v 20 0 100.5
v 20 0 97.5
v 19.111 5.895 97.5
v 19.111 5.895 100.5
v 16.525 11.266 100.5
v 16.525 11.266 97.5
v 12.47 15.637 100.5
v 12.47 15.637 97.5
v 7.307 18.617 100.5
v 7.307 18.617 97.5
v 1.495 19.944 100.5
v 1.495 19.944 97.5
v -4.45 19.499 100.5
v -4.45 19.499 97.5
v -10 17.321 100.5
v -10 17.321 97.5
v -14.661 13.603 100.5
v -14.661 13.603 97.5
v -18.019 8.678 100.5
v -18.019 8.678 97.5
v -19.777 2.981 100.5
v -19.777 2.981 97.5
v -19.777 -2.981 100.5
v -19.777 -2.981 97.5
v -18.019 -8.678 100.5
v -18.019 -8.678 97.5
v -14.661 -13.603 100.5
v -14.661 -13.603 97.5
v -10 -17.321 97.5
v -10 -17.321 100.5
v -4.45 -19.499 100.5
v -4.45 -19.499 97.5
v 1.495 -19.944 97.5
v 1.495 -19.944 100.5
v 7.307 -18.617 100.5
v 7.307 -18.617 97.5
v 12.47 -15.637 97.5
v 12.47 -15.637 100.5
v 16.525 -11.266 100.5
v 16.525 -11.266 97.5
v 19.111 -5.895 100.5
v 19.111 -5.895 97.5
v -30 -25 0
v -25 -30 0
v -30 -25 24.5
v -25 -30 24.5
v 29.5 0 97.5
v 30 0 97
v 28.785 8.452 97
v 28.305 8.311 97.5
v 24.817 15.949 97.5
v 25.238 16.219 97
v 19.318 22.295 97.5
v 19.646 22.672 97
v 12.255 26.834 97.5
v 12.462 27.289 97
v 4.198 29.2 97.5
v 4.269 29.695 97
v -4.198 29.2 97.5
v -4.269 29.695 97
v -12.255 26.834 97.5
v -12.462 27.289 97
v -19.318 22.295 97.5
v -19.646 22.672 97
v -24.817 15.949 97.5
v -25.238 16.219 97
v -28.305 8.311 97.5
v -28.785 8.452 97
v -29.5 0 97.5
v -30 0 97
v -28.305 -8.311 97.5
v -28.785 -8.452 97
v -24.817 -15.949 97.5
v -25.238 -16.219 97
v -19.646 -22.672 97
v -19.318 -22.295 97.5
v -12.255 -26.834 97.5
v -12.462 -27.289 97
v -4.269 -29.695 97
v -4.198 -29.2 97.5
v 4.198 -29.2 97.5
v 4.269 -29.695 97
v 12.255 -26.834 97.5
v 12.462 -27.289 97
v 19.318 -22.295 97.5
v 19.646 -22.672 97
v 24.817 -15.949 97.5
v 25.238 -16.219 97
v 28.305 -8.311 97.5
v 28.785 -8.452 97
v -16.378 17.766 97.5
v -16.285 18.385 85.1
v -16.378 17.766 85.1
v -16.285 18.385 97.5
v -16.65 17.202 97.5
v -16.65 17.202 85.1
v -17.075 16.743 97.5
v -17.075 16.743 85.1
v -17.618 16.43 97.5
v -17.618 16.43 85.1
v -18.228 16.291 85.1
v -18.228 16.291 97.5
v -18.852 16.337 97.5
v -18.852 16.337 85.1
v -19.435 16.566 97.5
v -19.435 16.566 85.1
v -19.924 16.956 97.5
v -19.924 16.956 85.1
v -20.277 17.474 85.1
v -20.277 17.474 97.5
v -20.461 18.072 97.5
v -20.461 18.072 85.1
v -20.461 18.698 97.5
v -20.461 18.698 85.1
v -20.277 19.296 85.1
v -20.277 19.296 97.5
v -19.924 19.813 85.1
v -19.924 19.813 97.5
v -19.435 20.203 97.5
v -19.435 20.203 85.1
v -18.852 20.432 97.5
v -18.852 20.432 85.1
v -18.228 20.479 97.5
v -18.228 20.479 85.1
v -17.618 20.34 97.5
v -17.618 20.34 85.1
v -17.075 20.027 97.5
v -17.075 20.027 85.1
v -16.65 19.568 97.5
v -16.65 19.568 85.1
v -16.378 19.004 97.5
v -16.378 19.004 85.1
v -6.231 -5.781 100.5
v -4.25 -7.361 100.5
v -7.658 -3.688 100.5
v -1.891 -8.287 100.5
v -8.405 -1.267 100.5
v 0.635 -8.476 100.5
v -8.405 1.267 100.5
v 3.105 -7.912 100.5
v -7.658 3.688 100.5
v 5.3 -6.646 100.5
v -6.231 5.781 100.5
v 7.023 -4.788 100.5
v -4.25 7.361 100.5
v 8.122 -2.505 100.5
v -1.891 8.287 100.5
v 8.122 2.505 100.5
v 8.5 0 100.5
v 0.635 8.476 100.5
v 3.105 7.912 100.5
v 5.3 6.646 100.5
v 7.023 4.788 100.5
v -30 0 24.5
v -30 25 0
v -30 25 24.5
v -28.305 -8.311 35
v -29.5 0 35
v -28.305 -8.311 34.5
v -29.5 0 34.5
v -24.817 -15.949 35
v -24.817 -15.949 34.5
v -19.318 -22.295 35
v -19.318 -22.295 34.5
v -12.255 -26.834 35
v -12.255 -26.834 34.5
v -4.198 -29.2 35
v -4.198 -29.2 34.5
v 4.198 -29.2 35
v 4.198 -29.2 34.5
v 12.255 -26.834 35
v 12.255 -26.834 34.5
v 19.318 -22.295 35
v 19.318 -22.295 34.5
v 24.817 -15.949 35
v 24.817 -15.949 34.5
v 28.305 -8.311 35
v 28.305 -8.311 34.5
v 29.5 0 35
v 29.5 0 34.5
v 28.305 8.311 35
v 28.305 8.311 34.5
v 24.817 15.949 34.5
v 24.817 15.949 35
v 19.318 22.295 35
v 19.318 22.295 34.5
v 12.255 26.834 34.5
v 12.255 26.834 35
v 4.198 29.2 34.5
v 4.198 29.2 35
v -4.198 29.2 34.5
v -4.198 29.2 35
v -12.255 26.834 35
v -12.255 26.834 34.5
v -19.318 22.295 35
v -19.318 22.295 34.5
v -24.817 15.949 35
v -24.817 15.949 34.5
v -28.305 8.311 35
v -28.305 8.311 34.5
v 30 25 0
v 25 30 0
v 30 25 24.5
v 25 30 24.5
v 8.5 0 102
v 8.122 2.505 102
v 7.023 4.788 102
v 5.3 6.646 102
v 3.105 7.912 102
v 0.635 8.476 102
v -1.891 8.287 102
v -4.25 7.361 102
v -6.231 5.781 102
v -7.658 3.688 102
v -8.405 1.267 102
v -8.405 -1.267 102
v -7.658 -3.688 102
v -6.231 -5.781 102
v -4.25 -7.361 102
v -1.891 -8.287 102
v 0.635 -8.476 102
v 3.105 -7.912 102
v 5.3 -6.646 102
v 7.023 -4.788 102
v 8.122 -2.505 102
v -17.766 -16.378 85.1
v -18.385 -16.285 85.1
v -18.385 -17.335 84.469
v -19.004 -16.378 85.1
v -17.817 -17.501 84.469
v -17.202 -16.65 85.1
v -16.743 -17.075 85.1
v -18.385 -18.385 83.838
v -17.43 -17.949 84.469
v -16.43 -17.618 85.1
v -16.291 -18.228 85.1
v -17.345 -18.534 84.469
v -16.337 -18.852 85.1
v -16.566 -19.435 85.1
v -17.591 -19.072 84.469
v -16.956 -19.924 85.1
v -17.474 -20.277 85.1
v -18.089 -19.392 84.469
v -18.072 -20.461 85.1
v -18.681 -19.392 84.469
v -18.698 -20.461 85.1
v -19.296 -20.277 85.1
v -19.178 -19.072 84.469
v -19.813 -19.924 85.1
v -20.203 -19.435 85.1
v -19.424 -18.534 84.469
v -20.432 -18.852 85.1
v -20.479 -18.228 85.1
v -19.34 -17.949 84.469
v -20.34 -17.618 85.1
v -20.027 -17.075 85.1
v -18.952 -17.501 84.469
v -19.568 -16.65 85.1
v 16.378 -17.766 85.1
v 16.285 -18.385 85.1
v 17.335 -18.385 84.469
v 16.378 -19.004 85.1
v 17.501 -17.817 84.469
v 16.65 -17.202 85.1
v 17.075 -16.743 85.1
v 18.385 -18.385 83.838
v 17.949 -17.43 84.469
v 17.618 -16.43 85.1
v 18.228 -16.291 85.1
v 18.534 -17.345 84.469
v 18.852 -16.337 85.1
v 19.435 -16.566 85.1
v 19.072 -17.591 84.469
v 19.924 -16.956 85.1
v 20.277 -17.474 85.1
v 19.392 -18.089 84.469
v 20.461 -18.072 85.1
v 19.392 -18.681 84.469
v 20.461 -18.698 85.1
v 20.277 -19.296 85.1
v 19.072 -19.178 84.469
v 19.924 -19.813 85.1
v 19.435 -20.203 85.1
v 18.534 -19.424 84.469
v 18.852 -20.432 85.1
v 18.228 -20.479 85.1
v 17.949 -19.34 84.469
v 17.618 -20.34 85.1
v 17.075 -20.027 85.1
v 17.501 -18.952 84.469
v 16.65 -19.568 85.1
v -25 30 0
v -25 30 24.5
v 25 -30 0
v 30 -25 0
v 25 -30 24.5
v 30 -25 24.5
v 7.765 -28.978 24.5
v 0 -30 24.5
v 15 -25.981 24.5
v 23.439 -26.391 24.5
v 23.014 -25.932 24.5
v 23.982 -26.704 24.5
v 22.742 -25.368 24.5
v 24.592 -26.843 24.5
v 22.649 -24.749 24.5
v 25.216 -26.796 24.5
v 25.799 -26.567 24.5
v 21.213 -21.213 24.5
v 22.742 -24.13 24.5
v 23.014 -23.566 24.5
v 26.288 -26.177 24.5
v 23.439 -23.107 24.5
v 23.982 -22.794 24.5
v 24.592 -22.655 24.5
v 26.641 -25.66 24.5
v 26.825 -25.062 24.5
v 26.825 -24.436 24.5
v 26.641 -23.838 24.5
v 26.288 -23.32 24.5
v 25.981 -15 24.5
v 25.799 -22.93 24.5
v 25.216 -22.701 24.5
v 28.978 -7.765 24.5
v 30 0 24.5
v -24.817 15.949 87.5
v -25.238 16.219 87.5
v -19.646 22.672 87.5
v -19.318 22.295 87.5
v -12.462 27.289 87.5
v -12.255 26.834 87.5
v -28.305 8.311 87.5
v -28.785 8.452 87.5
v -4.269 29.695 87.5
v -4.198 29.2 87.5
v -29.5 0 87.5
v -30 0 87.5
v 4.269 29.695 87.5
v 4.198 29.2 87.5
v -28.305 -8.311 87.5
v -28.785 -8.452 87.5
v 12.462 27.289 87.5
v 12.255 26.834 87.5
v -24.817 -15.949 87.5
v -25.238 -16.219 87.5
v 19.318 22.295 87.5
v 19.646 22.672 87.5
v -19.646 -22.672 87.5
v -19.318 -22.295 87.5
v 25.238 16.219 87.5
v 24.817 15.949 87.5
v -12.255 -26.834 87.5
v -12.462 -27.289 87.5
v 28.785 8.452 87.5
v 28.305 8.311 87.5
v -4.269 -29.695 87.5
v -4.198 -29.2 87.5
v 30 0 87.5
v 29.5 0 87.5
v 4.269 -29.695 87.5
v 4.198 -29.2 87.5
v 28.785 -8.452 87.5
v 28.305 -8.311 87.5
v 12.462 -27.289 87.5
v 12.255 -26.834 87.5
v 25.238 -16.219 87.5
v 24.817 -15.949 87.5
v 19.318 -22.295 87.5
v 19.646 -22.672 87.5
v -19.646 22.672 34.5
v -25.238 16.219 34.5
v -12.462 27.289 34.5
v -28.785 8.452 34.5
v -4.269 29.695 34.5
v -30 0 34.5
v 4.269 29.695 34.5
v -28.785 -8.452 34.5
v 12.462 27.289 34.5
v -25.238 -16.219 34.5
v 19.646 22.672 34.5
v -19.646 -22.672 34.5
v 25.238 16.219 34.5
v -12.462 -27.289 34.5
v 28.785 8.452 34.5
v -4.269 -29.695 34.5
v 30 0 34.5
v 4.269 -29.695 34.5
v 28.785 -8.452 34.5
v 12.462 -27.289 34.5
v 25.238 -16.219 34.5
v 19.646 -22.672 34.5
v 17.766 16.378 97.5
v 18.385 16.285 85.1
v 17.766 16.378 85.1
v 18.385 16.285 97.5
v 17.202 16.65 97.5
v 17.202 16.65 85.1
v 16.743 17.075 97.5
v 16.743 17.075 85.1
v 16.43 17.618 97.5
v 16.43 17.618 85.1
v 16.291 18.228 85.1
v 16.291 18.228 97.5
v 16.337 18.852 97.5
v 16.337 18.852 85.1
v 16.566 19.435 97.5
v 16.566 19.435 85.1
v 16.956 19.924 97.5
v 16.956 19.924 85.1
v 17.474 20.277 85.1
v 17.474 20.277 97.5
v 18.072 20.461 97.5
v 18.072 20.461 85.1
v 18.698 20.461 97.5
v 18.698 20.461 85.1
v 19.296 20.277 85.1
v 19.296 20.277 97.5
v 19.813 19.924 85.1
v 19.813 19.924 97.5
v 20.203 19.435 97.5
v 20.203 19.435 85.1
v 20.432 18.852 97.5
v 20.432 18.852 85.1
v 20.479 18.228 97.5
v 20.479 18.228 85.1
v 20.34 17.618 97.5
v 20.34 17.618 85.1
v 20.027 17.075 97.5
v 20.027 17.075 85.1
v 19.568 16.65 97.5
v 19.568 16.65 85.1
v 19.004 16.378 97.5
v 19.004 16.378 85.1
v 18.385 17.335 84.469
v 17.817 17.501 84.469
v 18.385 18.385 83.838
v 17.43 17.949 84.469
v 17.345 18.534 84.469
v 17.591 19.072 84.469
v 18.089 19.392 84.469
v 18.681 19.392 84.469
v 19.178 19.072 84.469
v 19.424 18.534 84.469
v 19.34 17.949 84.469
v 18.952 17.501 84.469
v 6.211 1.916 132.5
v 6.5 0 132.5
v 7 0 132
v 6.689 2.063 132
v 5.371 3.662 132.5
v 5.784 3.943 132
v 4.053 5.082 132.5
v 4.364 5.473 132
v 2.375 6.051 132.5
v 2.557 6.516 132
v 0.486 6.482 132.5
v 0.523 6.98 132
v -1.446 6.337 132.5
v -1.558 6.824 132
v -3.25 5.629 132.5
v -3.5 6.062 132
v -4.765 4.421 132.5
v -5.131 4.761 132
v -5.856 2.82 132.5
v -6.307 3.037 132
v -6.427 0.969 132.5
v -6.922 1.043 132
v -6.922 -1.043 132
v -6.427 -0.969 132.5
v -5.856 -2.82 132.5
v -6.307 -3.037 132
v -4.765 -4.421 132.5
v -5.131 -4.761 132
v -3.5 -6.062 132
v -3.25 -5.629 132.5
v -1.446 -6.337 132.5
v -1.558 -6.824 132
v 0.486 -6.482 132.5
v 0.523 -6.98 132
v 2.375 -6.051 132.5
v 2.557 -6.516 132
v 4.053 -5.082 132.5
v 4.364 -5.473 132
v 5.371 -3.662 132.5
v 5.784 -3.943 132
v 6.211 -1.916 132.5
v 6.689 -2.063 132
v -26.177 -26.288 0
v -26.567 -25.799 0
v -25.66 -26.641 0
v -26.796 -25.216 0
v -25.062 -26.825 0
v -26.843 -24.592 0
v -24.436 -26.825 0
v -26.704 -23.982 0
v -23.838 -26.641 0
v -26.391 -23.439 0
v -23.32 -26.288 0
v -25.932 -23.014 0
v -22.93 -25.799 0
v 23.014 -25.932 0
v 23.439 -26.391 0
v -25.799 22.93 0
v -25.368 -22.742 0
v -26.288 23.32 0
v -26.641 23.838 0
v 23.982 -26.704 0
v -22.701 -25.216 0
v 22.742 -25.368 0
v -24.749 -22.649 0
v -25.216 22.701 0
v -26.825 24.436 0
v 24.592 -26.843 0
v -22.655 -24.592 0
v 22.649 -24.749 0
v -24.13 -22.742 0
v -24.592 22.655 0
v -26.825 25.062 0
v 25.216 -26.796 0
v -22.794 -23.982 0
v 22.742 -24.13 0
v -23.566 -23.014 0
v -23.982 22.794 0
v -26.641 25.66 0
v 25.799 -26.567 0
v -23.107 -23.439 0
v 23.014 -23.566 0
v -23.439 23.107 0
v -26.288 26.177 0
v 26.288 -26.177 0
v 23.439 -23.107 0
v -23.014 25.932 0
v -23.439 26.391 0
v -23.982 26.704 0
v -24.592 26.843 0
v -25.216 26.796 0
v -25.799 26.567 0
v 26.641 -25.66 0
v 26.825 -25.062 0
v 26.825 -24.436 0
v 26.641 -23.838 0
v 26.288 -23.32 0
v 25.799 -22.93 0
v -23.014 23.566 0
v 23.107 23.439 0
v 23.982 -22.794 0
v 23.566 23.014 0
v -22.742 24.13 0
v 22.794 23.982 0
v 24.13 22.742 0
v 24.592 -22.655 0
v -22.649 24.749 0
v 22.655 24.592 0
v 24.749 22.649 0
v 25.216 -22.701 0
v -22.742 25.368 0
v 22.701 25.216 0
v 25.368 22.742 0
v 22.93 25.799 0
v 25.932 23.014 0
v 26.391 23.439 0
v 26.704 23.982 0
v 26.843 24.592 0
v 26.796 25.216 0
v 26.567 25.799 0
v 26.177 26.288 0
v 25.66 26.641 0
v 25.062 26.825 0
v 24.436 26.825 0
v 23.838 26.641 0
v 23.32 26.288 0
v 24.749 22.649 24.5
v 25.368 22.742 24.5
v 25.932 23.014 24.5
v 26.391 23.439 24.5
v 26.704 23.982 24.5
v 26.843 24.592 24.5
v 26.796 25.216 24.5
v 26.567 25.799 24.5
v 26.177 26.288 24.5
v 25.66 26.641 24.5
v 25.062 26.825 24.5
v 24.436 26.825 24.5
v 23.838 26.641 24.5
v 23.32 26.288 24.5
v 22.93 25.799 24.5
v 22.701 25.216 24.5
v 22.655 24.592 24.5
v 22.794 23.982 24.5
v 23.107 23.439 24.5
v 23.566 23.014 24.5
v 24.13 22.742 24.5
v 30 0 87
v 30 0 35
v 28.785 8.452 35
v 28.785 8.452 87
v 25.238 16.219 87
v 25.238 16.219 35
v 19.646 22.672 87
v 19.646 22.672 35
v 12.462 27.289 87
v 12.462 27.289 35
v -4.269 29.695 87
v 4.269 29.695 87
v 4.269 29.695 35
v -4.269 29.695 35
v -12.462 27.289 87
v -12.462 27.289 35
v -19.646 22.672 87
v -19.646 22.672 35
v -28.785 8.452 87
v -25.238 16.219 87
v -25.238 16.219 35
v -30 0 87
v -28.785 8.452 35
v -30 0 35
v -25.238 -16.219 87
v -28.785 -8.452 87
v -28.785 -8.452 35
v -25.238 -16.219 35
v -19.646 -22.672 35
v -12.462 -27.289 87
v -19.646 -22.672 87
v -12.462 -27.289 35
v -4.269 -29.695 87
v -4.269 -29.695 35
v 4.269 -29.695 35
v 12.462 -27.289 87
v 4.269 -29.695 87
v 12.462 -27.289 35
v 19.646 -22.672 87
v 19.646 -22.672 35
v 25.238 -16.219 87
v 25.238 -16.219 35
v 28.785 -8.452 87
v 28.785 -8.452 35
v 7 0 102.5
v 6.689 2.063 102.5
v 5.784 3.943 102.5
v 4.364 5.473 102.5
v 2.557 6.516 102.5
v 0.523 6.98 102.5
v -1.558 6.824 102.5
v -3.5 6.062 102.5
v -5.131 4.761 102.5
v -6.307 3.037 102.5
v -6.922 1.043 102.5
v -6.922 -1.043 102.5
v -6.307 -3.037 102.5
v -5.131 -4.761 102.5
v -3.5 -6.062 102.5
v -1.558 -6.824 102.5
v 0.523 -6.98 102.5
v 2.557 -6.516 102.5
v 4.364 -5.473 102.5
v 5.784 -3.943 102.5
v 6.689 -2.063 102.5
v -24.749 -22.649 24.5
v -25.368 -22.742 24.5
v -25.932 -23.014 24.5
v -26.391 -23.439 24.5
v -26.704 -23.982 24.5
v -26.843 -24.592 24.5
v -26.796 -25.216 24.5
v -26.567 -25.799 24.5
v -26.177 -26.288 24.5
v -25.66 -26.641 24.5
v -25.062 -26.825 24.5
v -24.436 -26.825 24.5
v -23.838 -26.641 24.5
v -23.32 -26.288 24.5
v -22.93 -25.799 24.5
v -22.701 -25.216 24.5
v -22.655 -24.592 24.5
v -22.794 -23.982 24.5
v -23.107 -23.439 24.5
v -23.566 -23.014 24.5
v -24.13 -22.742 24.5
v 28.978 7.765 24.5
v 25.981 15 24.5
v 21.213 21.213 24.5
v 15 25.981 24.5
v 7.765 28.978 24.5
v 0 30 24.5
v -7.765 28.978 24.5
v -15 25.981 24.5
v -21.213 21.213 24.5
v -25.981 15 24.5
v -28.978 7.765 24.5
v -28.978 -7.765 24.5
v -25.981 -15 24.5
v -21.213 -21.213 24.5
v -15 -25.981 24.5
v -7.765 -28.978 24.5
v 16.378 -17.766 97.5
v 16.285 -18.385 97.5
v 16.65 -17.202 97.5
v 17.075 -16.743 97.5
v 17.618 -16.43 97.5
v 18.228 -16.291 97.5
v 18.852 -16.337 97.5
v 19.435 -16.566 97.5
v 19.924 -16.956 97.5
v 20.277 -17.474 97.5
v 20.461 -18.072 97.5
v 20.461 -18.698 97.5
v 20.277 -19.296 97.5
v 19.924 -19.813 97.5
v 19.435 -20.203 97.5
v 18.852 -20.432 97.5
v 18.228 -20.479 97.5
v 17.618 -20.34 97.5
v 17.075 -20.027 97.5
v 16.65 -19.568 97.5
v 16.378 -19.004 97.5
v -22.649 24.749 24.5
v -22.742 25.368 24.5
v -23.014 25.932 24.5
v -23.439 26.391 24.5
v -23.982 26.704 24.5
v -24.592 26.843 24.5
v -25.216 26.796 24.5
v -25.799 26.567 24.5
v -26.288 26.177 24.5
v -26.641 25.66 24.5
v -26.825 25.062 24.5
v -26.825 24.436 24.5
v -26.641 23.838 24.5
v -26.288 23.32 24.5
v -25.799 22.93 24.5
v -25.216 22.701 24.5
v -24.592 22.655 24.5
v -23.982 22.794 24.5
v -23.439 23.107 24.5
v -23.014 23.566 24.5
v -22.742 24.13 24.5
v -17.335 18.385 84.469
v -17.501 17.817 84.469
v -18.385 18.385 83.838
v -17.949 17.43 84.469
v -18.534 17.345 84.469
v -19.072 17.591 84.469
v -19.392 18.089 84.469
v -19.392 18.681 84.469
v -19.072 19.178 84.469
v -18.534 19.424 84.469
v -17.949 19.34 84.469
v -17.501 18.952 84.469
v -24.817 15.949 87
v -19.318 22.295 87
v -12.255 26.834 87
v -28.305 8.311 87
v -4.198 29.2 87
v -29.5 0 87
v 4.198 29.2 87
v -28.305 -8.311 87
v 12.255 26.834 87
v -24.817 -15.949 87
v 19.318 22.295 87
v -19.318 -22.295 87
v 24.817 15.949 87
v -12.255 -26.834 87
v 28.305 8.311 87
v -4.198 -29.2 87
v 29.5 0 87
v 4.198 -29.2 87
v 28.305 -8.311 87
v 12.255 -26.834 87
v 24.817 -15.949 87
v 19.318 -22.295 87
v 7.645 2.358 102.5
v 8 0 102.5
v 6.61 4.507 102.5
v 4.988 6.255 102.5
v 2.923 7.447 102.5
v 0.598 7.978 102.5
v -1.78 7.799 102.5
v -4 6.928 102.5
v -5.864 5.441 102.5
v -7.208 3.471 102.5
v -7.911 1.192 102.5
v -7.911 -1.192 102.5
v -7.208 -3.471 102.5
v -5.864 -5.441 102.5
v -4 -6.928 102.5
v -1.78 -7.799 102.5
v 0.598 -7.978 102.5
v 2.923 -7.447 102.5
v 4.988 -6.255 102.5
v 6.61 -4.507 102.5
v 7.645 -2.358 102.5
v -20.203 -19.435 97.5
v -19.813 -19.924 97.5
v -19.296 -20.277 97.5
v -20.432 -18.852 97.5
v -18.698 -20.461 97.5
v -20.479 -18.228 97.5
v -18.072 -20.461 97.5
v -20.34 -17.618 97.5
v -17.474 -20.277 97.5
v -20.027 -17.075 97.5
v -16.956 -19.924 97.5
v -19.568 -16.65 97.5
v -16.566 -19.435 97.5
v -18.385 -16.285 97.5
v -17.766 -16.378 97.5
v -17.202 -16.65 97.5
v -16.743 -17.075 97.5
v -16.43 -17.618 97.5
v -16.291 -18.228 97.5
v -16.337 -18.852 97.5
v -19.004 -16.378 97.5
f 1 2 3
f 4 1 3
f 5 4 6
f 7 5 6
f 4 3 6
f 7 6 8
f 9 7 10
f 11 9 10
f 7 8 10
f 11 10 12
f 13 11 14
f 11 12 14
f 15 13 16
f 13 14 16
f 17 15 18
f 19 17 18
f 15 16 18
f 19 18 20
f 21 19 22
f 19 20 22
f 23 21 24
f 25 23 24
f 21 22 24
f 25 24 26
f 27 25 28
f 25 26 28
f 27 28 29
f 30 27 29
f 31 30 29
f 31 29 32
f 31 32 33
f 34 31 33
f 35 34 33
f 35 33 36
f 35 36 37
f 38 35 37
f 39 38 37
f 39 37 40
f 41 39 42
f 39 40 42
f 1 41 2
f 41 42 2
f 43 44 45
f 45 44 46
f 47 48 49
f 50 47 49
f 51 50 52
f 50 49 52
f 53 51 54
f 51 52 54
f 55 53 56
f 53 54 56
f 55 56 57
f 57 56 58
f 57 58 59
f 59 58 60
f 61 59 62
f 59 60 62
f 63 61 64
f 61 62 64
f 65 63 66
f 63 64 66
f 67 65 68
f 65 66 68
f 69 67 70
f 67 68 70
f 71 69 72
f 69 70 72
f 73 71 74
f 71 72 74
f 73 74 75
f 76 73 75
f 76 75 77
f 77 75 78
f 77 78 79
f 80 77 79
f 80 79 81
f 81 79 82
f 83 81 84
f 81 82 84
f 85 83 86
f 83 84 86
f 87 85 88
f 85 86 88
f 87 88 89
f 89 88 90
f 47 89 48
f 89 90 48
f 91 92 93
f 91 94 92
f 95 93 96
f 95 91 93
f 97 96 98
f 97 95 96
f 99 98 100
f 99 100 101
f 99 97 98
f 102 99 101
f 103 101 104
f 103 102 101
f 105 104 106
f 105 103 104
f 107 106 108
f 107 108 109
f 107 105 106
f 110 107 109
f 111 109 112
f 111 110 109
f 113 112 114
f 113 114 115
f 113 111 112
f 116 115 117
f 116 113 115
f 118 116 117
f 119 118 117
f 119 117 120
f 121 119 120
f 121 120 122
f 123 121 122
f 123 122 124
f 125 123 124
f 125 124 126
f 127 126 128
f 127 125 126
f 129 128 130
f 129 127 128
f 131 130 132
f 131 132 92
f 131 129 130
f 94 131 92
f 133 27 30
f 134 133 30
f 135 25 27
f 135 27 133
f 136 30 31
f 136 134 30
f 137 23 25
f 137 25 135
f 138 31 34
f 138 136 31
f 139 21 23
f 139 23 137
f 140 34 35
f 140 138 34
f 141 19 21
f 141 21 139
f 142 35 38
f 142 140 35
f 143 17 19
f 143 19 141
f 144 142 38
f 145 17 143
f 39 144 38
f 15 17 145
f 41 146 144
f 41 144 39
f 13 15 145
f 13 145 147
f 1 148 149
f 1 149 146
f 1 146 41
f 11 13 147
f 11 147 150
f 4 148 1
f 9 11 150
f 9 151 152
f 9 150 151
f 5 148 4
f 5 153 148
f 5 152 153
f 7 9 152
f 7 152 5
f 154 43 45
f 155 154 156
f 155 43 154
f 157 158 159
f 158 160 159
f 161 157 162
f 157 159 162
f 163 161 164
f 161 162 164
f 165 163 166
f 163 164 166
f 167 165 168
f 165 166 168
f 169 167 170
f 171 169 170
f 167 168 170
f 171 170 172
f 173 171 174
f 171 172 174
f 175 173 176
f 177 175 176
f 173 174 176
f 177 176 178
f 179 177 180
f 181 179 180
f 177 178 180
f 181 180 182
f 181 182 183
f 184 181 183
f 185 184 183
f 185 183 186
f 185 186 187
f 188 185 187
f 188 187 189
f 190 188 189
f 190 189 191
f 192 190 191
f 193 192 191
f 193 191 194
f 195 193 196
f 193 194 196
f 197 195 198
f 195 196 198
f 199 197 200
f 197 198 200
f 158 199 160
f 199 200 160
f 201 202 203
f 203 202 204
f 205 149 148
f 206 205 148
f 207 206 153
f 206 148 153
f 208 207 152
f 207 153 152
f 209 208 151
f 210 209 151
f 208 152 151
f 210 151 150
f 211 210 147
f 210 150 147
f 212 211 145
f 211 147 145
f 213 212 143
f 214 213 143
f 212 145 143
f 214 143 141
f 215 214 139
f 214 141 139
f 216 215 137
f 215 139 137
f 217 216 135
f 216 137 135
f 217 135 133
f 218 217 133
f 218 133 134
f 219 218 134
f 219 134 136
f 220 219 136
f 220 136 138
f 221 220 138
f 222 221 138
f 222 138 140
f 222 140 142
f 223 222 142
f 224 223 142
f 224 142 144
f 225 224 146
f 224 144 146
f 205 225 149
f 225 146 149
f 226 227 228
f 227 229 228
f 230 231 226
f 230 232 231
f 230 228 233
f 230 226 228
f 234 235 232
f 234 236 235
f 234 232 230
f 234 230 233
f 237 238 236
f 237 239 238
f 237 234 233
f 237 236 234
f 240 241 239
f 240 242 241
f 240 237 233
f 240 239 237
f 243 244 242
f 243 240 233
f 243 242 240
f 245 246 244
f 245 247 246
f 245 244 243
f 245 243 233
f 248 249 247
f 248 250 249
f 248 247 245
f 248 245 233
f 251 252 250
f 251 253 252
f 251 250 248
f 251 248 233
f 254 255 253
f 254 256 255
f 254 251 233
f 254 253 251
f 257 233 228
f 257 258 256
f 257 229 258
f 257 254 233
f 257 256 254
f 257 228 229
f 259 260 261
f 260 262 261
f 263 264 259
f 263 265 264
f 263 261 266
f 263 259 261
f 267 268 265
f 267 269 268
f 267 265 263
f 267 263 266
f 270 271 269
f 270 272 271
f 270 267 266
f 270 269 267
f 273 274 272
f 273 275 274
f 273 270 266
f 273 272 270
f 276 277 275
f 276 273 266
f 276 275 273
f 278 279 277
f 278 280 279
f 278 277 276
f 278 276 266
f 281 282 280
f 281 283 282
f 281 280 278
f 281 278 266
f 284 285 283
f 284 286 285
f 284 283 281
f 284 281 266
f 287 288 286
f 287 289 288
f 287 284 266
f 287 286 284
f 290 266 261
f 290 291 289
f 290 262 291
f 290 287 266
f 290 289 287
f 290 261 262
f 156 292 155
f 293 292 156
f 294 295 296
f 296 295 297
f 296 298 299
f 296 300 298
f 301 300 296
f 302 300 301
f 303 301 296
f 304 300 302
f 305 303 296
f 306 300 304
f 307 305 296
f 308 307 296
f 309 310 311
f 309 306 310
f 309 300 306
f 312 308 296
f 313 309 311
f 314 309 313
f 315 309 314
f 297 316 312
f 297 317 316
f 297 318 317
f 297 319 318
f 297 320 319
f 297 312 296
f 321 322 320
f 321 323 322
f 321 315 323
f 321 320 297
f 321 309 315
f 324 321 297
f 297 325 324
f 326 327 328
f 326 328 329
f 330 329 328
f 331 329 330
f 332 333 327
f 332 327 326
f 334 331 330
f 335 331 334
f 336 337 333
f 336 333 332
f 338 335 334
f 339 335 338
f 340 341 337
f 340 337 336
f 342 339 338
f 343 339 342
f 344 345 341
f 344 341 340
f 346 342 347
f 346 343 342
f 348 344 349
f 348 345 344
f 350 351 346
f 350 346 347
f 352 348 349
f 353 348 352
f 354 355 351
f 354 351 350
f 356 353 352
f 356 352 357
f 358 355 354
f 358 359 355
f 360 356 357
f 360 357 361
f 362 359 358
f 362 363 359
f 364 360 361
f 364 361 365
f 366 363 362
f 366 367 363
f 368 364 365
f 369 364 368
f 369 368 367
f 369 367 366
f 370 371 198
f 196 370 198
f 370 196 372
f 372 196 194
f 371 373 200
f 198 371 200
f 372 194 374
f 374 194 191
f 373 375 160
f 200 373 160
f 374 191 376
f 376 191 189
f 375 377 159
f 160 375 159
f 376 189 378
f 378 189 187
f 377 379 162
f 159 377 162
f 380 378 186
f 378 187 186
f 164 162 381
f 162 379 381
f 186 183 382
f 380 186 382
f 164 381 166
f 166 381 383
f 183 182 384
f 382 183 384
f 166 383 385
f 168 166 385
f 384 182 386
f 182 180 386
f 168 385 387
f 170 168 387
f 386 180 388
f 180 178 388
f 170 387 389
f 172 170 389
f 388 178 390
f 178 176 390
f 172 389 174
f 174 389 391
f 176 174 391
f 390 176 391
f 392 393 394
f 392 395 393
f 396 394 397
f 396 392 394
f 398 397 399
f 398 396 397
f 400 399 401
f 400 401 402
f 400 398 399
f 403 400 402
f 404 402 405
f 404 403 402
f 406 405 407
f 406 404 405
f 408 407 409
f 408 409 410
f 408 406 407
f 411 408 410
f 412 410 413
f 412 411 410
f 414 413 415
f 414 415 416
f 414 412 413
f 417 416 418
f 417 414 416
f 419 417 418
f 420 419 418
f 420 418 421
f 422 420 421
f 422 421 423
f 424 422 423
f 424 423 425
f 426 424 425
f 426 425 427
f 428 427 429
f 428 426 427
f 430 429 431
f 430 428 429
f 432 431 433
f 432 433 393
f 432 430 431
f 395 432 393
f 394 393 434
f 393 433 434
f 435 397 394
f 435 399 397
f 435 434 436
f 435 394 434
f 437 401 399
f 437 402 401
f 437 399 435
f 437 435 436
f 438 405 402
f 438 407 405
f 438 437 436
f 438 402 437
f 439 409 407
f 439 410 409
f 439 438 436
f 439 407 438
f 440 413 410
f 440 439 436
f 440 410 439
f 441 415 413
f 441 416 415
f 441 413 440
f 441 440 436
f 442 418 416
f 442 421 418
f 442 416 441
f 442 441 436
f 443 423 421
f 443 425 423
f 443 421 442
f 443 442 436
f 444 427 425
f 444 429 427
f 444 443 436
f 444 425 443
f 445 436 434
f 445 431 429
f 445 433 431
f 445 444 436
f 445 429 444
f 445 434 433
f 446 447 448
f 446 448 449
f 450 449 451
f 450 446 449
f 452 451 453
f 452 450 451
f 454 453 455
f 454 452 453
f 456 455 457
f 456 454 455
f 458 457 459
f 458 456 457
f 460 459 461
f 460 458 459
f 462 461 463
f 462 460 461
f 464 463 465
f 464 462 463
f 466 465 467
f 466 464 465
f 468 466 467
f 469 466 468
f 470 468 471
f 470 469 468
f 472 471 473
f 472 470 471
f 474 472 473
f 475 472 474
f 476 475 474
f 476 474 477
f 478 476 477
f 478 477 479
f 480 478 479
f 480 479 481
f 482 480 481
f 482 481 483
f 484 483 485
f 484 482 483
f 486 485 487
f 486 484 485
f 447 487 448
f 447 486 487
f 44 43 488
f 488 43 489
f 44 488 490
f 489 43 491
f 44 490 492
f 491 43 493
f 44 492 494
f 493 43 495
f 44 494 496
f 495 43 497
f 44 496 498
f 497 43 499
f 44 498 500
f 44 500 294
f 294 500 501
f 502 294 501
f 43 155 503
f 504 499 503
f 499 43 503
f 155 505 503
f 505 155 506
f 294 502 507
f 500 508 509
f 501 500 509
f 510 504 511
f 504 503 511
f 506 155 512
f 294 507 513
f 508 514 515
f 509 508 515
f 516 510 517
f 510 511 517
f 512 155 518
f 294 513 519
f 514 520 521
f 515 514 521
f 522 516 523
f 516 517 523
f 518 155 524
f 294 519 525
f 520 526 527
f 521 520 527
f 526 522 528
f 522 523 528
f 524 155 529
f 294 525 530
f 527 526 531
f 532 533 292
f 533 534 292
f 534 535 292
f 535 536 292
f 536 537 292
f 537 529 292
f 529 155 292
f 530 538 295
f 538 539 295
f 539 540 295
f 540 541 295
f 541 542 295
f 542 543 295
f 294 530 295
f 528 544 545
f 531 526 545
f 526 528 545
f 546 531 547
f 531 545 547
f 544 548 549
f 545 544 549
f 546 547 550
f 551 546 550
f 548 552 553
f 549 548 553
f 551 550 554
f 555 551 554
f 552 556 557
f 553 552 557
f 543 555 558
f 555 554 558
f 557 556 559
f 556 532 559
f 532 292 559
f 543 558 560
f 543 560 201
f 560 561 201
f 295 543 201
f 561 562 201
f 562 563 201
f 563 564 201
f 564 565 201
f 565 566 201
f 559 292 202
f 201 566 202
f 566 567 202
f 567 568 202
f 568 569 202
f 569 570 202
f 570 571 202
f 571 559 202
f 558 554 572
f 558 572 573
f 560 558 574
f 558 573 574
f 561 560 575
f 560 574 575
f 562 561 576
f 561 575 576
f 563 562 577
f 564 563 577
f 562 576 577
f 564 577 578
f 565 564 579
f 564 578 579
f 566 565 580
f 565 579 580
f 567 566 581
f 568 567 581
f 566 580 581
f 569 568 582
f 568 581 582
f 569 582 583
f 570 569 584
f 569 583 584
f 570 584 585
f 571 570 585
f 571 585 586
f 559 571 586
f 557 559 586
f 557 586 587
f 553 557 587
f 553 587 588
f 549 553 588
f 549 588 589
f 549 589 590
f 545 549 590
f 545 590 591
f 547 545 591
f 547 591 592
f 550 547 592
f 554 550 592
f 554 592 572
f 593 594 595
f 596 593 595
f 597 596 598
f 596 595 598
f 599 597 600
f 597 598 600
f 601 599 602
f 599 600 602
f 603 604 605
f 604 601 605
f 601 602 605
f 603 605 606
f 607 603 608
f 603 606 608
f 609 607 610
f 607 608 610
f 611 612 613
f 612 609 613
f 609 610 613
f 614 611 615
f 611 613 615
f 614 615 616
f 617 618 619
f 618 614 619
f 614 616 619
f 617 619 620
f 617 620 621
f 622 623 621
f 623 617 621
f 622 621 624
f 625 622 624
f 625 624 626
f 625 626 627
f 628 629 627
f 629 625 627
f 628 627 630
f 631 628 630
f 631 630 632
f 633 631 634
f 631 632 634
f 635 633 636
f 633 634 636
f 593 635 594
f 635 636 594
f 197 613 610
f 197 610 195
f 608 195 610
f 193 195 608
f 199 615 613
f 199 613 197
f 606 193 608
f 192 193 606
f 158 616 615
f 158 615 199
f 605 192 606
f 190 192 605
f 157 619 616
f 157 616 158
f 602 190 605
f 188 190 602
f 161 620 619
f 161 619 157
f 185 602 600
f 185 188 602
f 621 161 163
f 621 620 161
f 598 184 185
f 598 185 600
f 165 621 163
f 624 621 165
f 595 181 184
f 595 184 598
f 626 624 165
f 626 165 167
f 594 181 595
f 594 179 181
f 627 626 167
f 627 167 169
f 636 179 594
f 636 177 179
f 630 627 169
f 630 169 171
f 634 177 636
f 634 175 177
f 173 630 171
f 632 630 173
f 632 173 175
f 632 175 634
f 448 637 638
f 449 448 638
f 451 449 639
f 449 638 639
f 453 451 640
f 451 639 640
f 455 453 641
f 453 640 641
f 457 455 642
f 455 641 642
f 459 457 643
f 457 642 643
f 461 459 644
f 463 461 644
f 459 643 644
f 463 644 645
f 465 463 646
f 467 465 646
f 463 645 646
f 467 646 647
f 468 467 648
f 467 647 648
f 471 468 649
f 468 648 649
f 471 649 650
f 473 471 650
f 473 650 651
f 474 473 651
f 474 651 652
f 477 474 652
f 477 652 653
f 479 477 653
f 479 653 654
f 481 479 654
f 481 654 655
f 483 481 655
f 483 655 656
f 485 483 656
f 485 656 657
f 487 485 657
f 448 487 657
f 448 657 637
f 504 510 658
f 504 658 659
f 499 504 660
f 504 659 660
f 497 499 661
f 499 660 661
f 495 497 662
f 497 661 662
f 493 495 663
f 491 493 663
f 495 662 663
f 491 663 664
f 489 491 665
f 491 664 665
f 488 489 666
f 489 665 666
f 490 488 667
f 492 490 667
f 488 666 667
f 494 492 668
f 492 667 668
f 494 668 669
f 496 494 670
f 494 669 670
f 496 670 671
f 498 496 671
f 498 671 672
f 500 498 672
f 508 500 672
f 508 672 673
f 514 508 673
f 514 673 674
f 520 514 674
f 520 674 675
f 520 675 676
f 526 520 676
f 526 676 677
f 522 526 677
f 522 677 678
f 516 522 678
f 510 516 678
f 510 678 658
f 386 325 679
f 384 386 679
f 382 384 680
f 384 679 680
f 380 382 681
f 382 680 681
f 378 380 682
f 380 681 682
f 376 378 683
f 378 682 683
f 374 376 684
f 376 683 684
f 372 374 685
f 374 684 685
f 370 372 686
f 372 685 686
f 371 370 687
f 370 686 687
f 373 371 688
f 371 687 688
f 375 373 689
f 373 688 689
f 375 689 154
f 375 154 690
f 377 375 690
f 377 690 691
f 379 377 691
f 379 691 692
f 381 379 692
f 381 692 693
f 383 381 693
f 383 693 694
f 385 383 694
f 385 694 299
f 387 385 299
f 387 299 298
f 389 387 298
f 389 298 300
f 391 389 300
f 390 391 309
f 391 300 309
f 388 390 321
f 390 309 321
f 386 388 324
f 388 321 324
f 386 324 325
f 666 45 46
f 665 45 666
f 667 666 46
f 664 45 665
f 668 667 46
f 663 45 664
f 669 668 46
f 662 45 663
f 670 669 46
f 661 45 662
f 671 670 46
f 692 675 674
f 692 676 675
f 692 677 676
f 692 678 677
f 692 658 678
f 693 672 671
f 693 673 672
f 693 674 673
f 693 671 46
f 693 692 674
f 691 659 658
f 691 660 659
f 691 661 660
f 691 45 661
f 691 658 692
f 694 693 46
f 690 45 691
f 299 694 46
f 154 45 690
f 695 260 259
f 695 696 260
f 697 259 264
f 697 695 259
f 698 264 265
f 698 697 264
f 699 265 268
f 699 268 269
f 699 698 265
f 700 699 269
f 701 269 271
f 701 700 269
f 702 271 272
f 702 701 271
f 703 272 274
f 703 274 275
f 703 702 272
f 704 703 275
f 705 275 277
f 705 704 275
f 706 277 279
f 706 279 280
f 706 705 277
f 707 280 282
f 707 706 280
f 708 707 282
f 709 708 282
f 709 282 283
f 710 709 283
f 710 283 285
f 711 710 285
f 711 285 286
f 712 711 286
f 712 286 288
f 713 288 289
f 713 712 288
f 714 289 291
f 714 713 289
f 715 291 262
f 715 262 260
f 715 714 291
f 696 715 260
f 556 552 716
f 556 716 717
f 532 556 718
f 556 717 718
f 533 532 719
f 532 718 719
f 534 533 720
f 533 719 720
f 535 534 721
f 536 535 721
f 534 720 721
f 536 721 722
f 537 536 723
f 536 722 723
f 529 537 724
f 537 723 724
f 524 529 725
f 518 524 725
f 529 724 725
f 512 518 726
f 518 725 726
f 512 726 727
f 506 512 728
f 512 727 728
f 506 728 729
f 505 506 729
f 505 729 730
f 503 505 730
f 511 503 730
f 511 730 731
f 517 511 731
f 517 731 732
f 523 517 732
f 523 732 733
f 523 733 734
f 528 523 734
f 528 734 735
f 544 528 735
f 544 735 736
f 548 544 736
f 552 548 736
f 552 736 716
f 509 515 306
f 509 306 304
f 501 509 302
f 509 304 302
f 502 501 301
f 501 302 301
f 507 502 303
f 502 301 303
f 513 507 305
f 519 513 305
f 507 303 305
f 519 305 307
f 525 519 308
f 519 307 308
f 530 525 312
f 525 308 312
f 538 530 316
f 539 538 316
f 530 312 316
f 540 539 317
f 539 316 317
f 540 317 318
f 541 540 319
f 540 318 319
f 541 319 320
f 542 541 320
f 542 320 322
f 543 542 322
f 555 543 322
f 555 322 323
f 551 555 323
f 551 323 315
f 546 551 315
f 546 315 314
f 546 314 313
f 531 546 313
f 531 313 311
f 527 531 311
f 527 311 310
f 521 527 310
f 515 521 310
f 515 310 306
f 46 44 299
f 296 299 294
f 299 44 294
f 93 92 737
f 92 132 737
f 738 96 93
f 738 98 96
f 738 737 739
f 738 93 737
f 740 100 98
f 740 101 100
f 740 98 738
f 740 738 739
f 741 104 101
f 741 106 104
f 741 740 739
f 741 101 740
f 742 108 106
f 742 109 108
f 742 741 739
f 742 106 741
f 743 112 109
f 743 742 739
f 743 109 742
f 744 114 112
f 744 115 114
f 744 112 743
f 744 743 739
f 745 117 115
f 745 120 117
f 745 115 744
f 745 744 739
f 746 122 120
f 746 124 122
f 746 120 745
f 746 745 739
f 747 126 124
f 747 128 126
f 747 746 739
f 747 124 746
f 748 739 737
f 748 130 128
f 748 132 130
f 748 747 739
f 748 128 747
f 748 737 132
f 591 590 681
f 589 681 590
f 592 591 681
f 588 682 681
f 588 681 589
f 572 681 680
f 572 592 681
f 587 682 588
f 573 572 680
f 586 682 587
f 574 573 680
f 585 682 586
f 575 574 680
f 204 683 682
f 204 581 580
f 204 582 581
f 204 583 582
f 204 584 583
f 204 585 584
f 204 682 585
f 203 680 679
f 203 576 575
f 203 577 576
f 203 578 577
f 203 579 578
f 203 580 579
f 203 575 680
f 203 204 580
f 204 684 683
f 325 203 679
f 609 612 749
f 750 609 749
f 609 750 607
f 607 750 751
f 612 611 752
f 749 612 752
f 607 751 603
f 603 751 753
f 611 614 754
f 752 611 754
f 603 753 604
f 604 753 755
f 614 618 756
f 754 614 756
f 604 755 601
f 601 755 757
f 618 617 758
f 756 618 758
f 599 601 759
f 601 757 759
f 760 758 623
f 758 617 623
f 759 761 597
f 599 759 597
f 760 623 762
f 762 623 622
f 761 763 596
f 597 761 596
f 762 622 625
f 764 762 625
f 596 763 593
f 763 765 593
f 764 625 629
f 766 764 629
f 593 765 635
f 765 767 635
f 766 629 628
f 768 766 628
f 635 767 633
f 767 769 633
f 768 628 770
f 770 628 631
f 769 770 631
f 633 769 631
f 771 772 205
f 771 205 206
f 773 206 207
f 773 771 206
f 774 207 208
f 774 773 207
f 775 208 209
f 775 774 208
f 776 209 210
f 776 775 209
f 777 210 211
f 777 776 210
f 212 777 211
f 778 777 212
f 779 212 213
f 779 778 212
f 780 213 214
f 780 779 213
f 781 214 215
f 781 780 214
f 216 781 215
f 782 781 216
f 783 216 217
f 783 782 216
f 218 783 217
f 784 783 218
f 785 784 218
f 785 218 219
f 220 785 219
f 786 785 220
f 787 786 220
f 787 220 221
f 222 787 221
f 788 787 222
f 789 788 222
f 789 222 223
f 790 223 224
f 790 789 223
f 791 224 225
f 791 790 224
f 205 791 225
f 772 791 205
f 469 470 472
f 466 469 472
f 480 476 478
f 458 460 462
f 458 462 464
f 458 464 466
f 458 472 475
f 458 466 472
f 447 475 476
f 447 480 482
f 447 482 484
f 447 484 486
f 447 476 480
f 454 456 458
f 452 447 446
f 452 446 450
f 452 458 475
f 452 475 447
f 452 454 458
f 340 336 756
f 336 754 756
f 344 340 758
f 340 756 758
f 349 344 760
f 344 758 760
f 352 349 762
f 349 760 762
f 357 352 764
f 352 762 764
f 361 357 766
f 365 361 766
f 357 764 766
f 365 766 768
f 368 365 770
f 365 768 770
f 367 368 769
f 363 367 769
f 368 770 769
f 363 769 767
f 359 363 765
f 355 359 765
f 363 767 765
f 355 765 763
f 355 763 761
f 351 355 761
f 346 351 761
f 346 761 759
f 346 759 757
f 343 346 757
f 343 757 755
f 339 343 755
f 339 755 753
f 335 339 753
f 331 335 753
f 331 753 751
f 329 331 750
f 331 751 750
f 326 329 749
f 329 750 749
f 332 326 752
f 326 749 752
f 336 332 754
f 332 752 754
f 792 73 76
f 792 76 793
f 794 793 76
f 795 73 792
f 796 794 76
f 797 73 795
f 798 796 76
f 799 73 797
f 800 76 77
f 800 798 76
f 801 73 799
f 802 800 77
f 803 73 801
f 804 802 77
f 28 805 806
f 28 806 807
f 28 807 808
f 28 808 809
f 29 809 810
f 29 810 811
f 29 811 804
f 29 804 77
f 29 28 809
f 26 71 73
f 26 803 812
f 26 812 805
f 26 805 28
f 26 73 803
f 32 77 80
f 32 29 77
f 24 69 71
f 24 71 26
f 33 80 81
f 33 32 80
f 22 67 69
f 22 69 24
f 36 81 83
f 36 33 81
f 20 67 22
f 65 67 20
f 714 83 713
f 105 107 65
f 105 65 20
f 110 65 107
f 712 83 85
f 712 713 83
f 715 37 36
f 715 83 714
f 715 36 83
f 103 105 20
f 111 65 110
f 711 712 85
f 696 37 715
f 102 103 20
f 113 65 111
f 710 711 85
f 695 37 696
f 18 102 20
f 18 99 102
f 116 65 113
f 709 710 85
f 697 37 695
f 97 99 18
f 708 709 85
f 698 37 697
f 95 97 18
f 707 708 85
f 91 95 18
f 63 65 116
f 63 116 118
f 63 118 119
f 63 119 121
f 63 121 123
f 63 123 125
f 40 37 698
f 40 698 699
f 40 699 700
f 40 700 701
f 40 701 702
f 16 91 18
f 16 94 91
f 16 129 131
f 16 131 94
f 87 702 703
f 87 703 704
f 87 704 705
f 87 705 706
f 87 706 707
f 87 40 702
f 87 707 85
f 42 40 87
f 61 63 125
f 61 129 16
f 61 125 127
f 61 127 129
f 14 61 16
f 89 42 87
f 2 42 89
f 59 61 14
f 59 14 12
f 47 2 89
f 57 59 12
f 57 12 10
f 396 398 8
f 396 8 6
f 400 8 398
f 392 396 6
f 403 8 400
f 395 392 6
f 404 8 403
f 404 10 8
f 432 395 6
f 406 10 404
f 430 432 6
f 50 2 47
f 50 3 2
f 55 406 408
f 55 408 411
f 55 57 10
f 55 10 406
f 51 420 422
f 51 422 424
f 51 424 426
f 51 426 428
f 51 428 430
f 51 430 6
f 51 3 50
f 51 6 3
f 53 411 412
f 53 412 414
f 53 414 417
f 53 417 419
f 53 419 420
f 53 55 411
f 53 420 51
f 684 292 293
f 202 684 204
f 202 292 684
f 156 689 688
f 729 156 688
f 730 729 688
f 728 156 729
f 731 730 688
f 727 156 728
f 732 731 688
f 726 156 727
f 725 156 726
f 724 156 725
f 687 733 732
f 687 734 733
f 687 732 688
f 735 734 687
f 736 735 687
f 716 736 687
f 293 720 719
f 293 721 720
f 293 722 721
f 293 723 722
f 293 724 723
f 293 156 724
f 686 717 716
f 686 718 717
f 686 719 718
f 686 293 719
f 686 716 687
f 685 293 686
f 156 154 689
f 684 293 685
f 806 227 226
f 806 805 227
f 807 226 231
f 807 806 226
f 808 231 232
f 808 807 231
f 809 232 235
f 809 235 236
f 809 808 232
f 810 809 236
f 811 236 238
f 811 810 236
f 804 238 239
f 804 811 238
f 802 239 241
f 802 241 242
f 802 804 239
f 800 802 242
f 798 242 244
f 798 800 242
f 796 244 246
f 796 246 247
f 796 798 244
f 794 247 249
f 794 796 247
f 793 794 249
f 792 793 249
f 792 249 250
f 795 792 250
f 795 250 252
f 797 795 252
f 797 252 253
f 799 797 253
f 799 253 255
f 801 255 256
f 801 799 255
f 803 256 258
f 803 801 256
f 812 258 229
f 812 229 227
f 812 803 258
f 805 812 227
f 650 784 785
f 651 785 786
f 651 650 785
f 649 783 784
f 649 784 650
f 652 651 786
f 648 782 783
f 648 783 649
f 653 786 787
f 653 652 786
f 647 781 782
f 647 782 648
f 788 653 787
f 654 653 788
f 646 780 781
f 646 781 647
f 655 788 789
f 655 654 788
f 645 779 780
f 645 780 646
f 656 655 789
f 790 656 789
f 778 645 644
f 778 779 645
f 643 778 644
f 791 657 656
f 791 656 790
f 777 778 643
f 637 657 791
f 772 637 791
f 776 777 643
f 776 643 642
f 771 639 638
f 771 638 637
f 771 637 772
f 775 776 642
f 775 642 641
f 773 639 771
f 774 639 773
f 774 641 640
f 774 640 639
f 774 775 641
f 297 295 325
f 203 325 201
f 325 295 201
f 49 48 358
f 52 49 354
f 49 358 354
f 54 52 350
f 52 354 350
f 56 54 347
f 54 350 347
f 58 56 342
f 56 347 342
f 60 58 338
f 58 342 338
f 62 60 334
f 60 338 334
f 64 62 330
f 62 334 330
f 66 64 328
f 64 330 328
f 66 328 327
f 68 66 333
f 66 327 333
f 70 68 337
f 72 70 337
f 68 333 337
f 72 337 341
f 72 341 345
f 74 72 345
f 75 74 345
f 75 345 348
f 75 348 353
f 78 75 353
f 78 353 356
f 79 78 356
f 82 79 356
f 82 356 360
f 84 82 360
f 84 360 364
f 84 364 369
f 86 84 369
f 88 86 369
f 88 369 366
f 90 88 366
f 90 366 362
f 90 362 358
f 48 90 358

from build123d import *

# Parameters (mm, degrees)
SKETCH_1_W               = 60
SKETCH_1_H               = 60
EXTRUDE_1_DEPTH          = 24.5
CHAMFER_1_SIZE           = 5
SKETCH_2_R               = 30
EXTRUDE_2_DEPTH          = 73
SKETCH_3_W               = 0.5
SKETCH_3_H               = 3.76881343
SKETCH_4_R               = 7
EXTRUDE_3_DEPTH          = 35
SKETCH_5_R               = 20
EXTRUDE_4_DEPTH          = 3
SKETCH_6_R               = 8.5
EXTRUDE_5_DEPTH          = 2
PATTERN_CIRCULAR_1_COUNT = 4
HOLE_WIZARD_M5_2_D       = 4.2
PATTERN_CIRCULAR_2_COUNT = 4
CHAMFER_2_SIZE           = 0.5


with BuildPart() as part:
    # 草图1 → 凸台-拉伸1 (new body)
    with BuildSketch(Plane.XY):
        Rectangle(SKETCH_1_W, SKETCH_1_H)
    extrude(amount=EXTRUDE_1_DEPTH)

    # 倒角1
    chamfer_1_edges = [part.edges().sort_by_distance(p)[0] for p in [
        (30, -30, 12.25),
        (-30, -30, 12.25),
        (-30, 30, 12.25),
        (30, 30, 12.25),
    ]]
    chamfer(chamfer_1_edges, length=CHAMFER_1_SIZE)

    # 草图2 → 凸台-拉伸2 (add)
    with BuildSketch(Plane.XY.offset(24.5)):
        Circle(SKETCH_2_R)
    extrude(amount=EXTRUDE_2_DEPTH)

    # 草图3 → 切除-旋转1 (revolve, cut)
    with BuildSketch(Plane(origin=(0, 0, 0), x_dir=(0, 0, -1), z_dir=(1, 0, 0)), mode=Mode.PRIVATE) as cut_revolve_1_sk:
        with Locations((-87.25, 31.384406715)):
            Rectangle(SKETCH_3_W, SKETCH_3_H)
        with Locations((-34.75, 31.384406715)):
            Rectangle(SKETCH_3_W, SKETCH_3_H)
    revolve(cut_revolve_1_sk.sketch.rotate(Axis((0, 0, 0), (0, 0, 1)), 90), axis=Axis((0, 0, 0), (0, 0, 1)), mode=Mode.SUBTRACT)

    # 草图4 → 凸台-拉伸3 (add)
    with BuildSketch(Plane.XY.offset(97.5)):
        Circle(SKETCH_4_R)
    extrude(amount=EXTRUDE_3_DEPTH)

    # 草图5 → 凸台-拉伸4 (add)
    with BuildSketch(Plane.XY.offset(97.5)):
        Circle(SKETCH_5_R)
    extrude(amount=EXTRUDE_4_DEPTH)

    # 草图6 → 凸台-拉伸5 (add)
    with BuildSketch(Plane.XY.offset(100.5)):
        Circle(SKETCH_6_R)
    extrude(amount=EXTRUDE_5_DEPTH)

    # 草图7 → M5 螺纹孔1 (revolve, cut)
    with BuildSketch(Plane(origin=(18.384776311, 18.384776311, 97.5), x_dir=(0, -1, 0), z_dir=(1, 0, 0))):
        Polygon((0, 0), (0, 13.6618073), (2.1, 12.4), (2.1, 0), align=None)
    hole_wizard_m5_1 = revolve(axis=Axis((18.384776311, 18.384776311, 103.85), (0, 0, -1)), mode=Mode.SUBTRACT)

    # 阵列(圆周)1: M5 螺纹孔1 ×4 about axis
    pattern_circular_1_axis = Axis((0, 0, 0), (0, 0, 1))
    for i in range(1, PATTERN_CIRCULAR_1_COUNT):
        add(hole_wizard_m5_1.rotate(pattern_circular_1_axis, i * 360 / PATTERN_CIRCULAR_1_COUNT), mode=Mode.SUBTRACT)

    # M5 螺纹孔2 (through all)
    with Locations(Plane(origin=(0, 0, 0), x_dir=(-1, 0, 0), z_dir=(0, 0, -1))):
        with Locations((24.748737342, 24.748737342)):
            hole_wizard_m5_2 = Hole(HOLE_WIZARD_M5_2_D / 2)

    # 阵列(圆周)2: M5 螺纹孔2 ×4 about axis
    pattern_circular_2_axis = Axis((0, 0, 0), (0, 0, 1))
    for i in range(1, PATTERN_CIRCULAR_2_COUNT):
        add(hole_wizard_m5_2.rotate(pattern_circular_2_axis, i * 360 / PATTERN_CIRCULAR_2_COUNT), mode=Mode.SUBTRACT)

    # 倒角2
    chamfer_2_edges = [part.edges().sort_by_distance(p)[0] for p in [
        (-30, 0, 97.5),
        (-7, 0, 132.5),
        (-8.5, 0, 102.5),
    ]]
    chamfer(chamfer_2_edges, length=CHAMFER_2_SIZE)


solid = part.part
